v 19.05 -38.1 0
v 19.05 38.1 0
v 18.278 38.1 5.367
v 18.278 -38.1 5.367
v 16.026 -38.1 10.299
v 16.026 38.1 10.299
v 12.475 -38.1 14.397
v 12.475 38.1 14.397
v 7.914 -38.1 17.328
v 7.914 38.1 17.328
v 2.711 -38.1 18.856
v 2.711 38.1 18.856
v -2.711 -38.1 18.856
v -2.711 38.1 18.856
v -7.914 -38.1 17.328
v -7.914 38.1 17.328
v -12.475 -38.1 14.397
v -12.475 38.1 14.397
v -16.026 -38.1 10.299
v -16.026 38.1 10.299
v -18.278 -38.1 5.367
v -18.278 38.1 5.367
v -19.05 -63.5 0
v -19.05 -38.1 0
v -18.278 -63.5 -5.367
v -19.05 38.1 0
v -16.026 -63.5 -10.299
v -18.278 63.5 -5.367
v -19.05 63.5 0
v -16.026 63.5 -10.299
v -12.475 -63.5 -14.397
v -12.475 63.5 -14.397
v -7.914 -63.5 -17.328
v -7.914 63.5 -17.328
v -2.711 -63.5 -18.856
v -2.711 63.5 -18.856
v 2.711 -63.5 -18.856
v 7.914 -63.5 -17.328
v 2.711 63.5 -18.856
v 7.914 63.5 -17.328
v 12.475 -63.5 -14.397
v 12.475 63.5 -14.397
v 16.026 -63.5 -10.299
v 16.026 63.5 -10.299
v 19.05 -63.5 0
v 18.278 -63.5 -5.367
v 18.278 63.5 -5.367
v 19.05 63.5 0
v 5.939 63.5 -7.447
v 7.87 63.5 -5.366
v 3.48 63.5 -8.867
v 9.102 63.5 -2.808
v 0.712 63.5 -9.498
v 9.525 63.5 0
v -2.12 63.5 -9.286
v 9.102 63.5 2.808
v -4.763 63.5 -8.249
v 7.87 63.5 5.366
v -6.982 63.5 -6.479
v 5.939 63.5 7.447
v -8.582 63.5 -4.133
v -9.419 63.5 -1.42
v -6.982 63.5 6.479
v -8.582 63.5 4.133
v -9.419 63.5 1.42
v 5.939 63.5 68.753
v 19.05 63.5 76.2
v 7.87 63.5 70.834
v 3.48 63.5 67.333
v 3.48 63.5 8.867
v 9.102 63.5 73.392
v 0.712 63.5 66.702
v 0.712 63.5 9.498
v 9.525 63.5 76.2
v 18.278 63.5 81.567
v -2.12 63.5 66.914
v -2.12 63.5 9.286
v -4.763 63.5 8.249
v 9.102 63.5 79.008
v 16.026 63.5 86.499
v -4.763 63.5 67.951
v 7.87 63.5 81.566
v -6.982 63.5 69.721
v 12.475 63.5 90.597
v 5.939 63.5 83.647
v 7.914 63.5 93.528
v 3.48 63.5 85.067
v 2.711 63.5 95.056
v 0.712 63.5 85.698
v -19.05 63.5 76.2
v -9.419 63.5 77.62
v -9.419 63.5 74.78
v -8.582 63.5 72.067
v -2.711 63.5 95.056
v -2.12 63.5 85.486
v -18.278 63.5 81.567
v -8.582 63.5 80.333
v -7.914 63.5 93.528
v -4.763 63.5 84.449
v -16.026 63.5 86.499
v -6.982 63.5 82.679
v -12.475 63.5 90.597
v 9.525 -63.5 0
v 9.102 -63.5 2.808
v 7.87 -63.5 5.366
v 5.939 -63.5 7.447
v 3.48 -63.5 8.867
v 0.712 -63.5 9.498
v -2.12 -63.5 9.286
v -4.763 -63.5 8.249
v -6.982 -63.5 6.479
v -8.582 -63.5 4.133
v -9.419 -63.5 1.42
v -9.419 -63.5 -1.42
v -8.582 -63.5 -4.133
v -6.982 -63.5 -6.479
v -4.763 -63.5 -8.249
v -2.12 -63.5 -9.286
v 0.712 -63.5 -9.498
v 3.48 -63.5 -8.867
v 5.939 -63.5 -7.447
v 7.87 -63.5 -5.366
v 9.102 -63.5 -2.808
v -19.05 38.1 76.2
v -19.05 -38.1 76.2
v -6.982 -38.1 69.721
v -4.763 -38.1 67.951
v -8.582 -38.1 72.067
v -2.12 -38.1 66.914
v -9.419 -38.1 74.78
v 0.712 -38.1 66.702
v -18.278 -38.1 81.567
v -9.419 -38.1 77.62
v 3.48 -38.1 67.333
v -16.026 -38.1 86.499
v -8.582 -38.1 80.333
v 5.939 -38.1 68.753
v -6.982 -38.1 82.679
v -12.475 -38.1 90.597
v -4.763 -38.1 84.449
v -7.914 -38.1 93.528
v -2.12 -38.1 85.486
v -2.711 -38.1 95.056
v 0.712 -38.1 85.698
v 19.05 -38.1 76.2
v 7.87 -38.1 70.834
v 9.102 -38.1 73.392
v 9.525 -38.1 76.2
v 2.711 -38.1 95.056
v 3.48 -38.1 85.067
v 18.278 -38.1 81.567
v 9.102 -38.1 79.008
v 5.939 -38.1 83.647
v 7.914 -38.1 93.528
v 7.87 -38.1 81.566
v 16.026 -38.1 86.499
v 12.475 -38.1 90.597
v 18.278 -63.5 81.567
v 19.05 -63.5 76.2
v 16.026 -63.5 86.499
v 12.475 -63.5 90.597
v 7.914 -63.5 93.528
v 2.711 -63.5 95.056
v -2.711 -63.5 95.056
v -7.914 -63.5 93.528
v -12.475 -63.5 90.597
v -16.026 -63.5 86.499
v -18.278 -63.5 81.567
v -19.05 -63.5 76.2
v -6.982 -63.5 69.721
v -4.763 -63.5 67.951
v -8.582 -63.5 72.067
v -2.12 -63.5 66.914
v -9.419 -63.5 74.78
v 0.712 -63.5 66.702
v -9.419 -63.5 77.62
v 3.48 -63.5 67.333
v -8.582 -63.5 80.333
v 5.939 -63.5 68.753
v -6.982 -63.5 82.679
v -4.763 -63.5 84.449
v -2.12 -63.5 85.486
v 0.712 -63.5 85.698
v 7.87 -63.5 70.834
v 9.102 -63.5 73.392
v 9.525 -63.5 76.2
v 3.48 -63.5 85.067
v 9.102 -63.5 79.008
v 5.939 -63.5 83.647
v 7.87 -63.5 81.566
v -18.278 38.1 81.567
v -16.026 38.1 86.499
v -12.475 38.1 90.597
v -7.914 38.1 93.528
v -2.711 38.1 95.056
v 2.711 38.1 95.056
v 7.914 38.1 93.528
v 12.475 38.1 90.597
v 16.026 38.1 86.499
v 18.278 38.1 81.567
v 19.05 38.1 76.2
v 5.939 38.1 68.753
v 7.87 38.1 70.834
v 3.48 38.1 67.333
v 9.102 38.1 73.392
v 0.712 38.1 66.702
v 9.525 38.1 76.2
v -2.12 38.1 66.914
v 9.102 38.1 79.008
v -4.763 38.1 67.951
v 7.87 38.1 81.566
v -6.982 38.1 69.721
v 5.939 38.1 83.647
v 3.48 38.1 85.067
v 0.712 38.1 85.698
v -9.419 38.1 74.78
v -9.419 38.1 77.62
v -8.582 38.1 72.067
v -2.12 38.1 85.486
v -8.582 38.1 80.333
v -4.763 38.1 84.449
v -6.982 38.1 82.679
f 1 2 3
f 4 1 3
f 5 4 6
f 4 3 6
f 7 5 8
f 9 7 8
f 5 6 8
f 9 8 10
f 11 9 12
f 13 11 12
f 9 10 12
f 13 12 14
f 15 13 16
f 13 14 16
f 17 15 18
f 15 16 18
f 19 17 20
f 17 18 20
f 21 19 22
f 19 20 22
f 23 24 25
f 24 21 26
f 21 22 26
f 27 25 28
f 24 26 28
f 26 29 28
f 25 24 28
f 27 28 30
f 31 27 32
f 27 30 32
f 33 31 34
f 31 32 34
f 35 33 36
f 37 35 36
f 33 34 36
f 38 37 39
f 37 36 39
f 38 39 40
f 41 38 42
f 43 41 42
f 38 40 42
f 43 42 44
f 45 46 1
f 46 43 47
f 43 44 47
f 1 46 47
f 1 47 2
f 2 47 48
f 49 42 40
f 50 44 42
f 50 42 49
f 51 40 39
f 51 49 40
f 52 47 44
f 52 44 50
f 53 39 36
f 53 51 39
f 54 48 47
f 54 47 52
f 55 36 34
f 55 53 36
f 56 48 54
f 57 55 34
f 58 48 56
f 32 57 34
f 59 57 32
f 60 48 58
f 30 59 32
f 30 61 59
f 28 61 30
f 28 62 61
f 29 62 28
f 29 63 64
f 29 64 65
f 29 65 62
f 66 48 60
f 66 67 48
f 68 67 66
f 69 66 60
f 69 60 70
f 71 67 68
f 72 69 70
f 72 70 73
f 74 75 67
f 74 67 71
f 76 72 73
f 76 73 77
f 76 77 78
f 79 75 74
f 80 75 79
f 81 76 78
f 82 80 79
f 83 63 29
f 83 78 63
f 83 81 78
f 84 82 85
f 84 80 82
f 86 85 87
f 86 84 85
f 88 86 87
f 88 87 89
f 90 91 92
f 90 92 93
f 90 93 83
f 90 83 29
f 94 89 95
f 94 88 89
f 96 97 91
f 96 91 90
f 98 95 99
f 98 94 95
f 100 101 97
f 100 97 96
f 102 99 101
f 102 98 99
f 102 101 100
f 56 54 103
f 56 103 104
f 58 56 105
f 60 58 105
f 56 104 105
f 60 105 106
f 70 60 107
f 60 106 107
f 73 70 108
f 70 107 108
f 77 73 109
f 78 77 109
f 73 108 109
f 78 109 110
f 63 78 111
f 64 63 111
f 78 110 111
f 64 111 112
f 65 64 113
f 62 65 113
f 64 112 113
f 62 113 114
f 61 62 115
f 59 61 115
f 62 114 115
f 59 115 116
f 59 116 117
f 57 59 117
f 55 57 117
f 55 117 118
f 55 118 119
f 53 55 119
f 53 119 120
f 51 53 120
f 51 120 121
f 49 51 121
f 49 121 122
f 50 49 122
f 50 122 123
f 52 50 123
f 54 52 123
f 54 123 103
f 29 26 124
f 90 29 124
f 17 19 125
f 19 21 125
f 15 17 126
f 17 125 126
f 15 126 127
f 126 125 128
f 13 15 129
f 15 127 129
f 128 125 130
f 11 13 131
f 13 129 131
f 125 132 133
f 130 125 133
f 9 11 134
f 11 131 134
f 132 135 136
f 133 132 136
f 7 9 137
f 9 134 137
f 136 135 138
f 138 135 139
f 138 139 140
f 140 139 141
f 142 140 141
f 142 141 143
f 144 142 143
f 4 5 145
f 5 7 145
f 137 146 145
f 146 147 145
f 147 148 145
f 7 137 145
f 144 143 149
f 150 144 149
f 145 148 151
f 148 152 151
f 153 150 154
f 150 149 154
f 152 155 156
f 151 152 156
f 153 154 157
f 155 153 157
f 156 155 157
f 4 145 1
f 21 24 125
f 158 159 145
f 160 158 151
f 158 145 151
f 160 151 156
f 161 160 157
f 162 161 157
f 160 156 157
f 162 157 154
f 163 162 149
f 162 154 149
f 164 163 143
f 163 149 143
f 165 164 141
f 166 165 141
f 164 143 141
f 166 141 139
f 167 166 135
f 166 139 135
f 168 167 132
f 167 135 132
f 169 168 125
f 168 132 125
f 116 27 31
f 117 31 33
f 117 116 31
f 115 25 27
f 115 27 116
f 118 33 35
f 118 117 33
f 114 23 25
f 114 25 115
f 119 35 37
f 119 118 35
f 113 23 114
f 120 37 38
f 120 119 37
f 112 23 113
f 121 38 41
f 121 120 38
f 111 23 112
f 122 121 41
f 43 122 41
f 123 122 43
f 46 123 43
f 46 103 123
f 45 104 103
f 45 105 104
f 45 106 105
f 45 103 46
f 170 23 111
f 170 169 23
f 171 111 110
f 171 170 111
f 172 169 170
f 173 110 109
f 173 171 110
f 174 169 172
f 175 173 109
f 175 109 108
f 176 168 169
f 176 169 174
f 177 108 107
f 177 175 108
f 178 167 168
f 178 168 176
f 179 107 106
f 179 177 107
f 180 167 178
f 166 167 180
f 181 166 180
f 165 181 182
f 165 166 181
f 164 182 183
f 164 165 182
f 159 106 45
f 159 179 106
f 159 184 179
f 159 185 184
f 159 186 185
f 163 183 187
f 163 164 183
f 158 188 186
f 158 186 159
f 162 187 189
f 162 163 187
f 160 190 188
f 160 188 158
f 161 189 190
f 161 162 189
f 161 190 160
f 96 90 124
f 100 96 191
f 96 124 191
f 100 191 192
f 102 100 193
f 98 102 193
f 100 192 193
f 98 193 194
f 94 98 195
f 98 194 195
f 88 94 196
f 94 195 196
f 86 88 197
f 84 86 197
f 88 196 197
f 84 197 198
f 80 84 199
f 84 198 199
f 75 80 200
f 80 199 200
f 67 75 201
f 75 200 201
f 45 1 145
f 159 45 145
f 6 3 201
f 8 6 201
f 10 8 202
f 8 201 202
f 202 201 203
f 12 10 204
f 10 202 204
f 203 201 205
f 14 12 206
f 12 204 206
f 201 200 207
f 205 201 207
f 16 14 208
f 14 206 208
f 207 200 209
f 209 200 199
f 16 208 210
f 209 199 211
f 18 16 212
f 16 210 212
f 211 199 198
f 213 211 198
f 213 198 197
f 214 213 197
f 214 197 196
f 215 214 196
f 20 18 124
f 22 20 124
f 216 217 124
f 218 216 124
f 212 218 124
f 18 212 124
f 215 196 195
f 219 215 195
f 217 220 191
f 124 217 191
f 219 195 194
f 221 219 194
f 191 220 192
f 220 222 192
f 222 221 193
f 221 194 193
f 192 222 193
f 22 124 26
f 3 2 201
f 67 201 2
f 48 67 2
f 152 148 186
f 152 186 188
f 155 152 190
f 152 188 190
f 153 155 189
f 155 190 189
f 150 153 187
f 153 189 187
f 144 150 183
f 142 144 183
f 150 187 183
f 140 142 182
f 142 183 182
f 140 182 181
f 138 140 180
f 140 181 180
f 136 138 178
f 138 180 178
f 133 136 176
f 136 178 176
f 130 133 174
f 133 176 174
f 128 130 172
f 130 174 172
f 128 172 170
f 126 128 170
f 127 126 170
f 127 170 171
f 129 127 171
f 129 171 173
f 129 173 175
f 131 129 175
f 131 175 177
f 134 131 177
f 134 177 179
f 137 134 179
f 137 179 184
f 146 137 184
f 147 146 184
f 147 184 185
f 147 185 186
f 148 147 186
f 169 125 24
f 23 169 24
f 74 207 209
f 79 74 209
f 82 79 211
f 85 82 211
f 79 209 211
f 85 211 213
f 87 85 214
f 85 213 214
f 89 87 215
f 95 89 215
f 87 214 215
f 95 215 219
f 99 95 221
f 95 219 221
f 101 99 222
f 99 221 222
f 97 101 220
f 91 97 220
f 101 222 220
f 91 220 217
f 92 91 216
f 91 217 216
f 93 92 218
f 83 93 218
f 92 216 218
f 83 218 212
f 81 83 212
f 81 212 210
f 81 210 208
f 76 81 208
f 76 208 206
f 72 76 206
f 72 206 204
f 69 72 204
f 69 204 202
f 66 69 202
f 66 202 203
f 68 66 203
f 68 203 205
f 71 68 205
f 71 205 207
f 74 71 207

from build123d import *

# Parameters (mm, degrees)
F0_R     = 19.05
F1_DEPTH = 38.1
F3_DEPTH = 25.4
F5_DEPTH = 25.4
F6_R     = 9.525
F7_DEPTH = 138.43


with BuildPart() as f1:
    # F0 (on Front) → F1 (new body, symmetric)
    with BuildSketch(Plane.XZ):
        Circle(F0_R)
    extrude(amount=F1_DEPTH, both=True)

    # F2 (on face) → F3 (join)
    with BuildSketch(Plane(origin=(0, 38.1, 0), x_dir=(-1, 0, 0), z_dir=(0, 1, 0))):
        with BuildLine():
            ThreePointArc((-19.05, 0), (0, 19.05), (19.05, 0))
            Line((19.05, 0), (19.05, 76.2))
            Line((19.05, 76.2), (-19.05, 76.2))
            Line((-19.05, 76.2), (-19.05, 0))
        make_face()
        with BuildLine():
            Line((-19.05, 76.2), (19.05, 76.2))
            ThreePointArc((19.05, 76.2), (0, 95.25), (-19.05, 76.2))
        make_face()
        with BuildLine():
            ThreePointArc((-19.05, 0), (0, -19.05), (19.05, 0))
            ThreePointArc((19.05, 0), (0, 19.05), (-19.05, 0))
        make_face()
    extrude(amount=F3_DEPTH)

    # F4 (on face) → F5 (join)
    with BuildSketch(Plane.XZ.offset(38.1)):
        with BuildLine():
            Line((-19.05, 76.2), (19.05, 76.2))
            ThreePointArc((19.05, 76.2), (0, 95.25), (-19.05, 76.2))
        make_face()
        with BuildLine():
            ThreePointArc((-19.05, 0), (0, 19.05), (19.05, 0))
            Line((19.05, 0), (19.05, 76.2))
            Line((19.05, 76.2), (-19.05, 76.2))
            Line((-19.05, 76.2), (-19.05, 0))
        make_face()
        with BuildLine():
            ThreePointArc((-19.05, 0), (0, -19.05), (19.05, 0))
            ThreePointArc((19.05, 0), (0, 19.05), (-19.05, 0))
        make_face()
    extrude(amount=F5_DEPTH)

    # F6 (on face) → F7 (cut)
    with BuildSketch(Plane.XZ.offset(63.5)):
        with Locations((0, 76.2)):
            Circle(F6_R)
        Circle(F6_R)
    extrude(amount=-F7_DEPTH, mode=Mode.SUBTRACT)


solid = f1.part
